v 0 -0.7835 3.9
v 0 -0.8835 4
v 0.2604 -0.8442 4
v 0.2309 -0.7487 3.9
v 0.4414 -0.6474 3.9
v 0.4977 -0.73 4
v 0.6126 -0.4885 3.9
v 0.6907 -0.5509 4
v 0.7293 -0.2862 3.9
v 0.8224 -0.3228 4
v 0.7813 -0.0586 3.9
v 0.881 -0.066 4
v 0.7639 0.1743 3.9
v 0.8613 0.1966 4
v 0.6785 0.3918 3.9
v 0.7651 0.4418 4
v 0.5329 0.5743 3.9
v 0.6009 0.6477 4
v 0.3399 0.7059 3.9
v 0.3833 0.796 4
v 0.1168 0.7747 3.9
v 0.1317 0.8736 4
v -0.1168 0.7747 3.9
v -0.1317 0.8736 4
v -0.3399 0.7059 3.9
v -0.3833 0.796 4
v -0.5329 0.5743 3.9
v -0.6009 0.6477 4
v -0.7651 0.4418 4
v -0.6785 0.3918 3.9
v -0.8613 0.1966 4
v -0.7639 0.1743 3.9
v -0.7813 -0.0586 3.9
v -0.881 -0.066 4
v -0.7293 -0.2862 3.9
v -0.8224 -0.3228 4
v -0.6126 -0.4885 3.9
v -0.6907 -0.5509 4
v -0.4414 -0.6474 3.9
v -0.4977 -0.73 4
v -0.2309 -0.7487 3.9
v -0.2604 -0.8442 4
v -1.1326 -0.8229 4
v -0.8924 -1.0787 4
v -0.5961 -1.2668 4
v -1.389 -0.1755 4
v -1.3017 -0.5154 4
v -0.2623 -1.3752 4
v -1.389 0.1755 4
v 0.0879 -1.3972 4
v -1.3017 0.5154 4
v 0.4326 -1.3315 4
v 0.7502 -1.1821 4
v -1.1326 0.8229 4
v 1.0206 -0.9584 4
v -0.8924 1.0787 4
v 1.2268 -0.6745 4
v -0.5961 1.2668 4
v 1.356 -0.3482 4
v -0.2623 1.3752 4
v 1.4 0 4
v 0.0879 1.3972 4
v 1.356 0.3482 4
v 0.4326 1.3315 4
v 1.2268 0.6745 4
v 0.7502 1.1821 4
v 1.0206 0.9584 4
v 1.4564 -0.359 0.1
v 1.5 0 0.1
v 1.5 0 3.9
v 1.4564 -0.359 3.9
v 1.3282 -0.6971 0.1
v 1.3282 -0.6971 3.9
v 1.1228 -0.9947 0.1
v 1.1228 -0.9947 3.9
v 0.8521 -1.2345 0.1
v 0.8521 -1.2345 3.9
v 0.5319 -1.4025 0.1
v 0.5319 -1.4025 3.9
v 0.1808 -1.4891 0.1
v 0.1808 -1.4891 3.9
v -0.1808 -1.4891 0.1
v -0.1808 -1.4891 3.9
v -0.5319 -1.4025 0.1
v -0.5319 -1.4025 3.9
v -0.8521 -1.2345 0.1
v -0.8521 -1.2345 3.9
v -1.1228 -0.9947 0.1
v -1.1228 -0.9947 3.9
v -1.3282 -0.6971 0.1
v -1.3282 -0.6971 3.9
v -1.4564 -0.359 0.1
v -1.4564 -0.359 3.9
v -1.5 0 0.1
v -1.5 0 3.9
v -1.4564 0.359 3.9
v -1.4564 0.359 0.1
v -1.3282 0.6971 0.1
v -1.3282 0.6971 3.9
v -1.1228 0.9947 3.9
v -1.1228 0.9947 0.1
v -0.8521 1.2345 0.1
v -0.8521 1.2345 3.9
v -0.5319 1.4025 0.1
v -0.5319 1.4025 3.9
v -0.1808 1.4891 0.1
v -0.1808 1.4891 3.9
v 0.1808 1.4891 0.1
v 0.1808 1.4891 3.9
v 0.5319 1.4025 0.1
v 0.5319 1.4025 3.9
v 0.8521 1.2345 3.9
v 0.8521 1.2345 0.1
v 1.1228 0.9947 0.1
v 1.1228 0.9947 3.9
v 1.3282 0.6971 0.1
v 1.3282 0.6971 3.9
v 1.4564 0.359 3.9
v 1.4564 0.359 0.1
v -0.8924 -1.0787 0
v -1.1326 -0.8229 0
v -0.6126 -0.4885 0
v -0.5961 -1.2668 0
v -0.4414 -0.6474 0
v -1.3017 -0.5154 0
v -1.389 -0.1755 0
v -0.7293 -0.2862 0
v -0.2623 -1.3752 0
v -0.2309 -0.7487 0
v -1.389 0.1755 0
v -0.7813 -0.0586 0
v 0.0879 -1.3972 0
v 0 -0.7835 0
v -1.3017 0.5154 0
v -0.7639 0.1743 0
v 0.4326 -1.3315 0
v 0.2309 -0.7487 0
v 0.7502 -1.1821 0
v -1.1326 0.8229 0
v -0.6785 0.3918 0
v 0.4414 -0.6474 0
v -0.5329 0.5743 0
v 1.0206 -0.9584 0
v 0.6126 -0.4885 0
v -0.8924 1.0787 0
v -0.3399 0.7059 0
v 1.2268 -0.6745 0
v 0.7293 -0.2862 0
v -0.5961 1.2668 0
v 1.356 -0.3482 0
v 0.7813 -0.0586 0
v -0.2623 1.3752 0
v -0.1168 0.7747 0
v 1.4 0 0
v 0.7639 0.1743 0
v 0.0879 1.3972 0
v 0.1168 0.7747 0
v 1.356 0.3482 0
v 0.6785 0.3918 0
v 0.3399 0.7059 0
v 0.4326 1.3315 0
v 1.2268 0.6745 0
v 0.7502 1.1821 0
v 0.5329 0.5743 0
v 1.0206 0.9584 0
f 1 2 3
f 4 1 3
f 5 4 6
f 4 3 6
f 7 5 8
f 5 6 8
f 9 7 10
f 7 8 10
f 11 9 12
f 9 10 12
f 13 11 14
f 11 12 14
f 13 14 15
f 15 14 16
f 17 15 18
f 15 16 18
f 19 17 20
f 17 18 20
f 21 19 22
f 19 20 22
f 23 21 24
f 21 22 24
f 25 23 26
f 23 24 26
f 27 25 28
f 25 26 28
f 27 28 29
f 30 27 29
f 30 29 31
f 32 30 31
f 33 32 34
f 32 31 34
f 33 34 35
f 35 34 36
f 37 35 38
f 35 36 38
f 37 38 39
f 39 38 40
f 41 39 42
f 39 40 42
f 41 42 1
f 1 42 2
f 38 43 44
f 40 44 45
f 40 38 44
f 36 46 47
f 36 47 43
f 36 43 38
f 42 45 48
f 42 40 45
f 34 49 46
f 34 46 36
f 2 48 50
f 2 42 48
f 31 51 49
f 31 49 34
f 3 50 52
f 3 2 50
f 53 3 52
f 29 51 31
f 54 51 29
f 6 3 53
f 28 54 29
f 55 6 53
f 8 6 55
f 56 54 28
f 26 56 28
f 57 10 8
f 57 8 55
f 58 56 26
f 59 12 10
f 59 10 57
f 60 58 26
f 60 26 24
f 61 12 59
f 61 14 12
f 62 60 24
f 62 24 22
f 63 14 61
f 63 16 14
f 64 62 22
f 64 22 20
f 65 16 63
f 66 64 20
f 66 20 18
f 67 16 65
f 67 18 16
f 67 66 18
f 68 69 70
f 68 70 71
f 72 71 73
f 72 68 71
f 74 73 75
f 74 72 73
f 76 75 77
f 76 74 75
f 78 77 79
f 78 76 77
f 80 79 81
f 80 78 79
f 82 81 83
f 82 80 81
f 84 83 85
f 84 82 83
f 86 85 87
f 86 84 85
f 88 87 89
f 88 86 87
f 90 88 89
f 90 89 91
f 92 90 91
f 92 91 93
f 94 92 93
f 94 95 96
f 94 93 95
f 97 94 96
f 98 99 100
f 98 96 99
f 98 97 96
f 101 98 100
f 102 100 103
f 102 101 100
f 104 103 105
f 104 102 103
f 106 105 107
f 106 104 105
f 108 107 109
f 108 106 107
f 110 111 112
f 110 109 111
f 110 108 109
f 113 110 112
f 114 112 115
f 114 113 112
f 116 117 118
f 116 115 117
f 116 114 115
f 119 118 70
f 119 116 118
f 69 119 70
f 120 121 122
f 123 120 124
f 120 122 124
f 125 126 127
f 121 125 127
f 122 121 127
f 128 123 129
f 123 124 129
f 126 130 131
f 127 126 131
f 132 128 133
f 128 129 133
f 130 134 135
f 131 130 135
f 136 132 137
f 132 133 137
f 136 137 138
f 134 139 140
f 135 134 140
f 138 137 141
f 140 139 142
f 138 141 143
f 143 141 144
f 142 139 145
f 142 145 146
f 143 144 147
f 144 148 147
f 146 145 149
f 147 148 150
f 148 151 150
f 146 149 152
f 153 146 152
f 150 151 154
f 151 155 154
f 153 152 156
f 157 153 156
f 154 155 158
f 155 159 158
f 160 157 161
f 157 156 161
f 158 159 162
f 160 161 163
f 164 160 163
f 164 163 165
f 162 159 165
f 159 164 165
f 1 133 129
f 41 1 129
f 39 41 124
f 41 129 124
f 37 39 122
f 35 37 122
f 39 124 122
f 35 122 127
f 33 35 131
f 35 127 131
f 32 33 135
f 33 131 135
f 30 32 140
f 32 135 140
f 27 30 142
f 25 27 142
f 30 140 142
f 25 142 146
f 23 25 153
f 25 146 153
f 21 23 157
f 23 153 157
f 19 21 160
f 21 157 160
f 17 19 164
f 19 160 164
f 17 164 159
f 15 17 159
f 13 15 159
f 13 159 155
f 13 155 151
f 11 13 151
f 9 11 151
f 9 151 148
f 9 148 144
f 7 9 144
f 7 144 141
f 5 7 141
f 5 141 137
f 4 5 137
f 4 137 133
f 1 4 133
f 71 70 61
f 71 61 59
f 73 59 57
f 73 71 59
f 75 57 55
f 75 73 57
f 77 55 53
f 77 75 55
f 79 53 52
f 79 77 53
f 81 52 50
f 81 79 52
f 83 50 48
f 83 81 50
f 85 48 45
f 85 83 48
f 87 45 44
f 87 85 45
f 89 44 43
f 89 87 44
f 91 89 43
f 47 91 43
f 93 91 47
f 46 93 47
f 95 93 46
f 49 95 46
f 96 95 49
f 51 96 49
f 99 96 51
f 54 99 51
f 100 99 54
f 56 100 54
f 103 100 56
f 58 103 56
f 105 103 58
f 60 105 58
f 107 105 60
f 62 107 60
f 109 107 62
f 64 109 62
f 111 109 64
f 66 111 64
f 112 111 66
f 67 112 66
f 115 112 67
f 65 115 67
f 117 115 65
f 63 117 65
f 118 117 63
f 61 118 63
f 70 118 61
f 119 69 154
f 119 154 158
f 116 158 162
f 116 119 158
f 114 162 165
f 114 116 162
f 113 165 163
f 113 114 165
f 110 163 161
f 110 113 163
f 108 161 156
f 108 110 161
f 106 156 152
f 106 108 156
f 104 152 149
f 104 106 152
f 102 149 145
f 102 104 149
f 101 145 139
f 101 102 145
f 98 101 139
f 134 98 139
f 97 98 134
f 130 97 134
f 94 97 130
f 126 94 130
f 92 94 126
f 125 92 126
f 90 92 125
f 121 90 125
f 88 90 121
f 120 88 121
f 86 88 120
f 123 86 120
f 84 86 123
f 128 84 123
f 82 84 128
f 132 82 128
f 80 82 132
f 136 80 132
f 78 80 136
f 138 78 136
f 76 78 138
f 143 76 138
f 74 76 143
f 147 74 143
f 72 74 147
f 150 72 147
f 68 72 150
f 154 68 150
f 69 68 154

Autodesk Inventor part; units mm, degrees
ref_plane "YZ Plane" through (0, 0, 0) normal (1, 0, 0) x (0, 1, 0)
ref_plane "XZ Plane" through (0, 0, 0) normal (0, 1, 0) x (-1, 0, 0)
ref_plane "XY Plane" through (0, 0, 0) normal (0, 0, 1) x (1, 0, 0)
sketch "スケッチ1" plane through (0, 0, 0) normal (0, 0, 1) x (1, 0, 0)
  circle A0 centre (0, 0) radius 1.5
  dimension "d0" = 3
extrude "押し出し1" add sketch "スケッチ1" along normal blind 4
sketch "スケッチ2" plane through (0, 0, 4) normal (0, 0, 1) x (1, 0, 0)
  circle A0 centre (0, 0) radius 1.5 construction
hole "穴1" at (0, 0, 4) direction (0, 0, -1) diameter 1.567 end through all thread size "M2x0.4" class "6H" standard "ANSI Metric M Profile"
chamfer "面取り1" distance 0.1 angle 45 3 edges at (0, 0.7835, 4) (-1.5, 0, 4) (-1.5, 0, 0)
properties part number "SB-203040" material "真鍮、ソフト イエロー"
